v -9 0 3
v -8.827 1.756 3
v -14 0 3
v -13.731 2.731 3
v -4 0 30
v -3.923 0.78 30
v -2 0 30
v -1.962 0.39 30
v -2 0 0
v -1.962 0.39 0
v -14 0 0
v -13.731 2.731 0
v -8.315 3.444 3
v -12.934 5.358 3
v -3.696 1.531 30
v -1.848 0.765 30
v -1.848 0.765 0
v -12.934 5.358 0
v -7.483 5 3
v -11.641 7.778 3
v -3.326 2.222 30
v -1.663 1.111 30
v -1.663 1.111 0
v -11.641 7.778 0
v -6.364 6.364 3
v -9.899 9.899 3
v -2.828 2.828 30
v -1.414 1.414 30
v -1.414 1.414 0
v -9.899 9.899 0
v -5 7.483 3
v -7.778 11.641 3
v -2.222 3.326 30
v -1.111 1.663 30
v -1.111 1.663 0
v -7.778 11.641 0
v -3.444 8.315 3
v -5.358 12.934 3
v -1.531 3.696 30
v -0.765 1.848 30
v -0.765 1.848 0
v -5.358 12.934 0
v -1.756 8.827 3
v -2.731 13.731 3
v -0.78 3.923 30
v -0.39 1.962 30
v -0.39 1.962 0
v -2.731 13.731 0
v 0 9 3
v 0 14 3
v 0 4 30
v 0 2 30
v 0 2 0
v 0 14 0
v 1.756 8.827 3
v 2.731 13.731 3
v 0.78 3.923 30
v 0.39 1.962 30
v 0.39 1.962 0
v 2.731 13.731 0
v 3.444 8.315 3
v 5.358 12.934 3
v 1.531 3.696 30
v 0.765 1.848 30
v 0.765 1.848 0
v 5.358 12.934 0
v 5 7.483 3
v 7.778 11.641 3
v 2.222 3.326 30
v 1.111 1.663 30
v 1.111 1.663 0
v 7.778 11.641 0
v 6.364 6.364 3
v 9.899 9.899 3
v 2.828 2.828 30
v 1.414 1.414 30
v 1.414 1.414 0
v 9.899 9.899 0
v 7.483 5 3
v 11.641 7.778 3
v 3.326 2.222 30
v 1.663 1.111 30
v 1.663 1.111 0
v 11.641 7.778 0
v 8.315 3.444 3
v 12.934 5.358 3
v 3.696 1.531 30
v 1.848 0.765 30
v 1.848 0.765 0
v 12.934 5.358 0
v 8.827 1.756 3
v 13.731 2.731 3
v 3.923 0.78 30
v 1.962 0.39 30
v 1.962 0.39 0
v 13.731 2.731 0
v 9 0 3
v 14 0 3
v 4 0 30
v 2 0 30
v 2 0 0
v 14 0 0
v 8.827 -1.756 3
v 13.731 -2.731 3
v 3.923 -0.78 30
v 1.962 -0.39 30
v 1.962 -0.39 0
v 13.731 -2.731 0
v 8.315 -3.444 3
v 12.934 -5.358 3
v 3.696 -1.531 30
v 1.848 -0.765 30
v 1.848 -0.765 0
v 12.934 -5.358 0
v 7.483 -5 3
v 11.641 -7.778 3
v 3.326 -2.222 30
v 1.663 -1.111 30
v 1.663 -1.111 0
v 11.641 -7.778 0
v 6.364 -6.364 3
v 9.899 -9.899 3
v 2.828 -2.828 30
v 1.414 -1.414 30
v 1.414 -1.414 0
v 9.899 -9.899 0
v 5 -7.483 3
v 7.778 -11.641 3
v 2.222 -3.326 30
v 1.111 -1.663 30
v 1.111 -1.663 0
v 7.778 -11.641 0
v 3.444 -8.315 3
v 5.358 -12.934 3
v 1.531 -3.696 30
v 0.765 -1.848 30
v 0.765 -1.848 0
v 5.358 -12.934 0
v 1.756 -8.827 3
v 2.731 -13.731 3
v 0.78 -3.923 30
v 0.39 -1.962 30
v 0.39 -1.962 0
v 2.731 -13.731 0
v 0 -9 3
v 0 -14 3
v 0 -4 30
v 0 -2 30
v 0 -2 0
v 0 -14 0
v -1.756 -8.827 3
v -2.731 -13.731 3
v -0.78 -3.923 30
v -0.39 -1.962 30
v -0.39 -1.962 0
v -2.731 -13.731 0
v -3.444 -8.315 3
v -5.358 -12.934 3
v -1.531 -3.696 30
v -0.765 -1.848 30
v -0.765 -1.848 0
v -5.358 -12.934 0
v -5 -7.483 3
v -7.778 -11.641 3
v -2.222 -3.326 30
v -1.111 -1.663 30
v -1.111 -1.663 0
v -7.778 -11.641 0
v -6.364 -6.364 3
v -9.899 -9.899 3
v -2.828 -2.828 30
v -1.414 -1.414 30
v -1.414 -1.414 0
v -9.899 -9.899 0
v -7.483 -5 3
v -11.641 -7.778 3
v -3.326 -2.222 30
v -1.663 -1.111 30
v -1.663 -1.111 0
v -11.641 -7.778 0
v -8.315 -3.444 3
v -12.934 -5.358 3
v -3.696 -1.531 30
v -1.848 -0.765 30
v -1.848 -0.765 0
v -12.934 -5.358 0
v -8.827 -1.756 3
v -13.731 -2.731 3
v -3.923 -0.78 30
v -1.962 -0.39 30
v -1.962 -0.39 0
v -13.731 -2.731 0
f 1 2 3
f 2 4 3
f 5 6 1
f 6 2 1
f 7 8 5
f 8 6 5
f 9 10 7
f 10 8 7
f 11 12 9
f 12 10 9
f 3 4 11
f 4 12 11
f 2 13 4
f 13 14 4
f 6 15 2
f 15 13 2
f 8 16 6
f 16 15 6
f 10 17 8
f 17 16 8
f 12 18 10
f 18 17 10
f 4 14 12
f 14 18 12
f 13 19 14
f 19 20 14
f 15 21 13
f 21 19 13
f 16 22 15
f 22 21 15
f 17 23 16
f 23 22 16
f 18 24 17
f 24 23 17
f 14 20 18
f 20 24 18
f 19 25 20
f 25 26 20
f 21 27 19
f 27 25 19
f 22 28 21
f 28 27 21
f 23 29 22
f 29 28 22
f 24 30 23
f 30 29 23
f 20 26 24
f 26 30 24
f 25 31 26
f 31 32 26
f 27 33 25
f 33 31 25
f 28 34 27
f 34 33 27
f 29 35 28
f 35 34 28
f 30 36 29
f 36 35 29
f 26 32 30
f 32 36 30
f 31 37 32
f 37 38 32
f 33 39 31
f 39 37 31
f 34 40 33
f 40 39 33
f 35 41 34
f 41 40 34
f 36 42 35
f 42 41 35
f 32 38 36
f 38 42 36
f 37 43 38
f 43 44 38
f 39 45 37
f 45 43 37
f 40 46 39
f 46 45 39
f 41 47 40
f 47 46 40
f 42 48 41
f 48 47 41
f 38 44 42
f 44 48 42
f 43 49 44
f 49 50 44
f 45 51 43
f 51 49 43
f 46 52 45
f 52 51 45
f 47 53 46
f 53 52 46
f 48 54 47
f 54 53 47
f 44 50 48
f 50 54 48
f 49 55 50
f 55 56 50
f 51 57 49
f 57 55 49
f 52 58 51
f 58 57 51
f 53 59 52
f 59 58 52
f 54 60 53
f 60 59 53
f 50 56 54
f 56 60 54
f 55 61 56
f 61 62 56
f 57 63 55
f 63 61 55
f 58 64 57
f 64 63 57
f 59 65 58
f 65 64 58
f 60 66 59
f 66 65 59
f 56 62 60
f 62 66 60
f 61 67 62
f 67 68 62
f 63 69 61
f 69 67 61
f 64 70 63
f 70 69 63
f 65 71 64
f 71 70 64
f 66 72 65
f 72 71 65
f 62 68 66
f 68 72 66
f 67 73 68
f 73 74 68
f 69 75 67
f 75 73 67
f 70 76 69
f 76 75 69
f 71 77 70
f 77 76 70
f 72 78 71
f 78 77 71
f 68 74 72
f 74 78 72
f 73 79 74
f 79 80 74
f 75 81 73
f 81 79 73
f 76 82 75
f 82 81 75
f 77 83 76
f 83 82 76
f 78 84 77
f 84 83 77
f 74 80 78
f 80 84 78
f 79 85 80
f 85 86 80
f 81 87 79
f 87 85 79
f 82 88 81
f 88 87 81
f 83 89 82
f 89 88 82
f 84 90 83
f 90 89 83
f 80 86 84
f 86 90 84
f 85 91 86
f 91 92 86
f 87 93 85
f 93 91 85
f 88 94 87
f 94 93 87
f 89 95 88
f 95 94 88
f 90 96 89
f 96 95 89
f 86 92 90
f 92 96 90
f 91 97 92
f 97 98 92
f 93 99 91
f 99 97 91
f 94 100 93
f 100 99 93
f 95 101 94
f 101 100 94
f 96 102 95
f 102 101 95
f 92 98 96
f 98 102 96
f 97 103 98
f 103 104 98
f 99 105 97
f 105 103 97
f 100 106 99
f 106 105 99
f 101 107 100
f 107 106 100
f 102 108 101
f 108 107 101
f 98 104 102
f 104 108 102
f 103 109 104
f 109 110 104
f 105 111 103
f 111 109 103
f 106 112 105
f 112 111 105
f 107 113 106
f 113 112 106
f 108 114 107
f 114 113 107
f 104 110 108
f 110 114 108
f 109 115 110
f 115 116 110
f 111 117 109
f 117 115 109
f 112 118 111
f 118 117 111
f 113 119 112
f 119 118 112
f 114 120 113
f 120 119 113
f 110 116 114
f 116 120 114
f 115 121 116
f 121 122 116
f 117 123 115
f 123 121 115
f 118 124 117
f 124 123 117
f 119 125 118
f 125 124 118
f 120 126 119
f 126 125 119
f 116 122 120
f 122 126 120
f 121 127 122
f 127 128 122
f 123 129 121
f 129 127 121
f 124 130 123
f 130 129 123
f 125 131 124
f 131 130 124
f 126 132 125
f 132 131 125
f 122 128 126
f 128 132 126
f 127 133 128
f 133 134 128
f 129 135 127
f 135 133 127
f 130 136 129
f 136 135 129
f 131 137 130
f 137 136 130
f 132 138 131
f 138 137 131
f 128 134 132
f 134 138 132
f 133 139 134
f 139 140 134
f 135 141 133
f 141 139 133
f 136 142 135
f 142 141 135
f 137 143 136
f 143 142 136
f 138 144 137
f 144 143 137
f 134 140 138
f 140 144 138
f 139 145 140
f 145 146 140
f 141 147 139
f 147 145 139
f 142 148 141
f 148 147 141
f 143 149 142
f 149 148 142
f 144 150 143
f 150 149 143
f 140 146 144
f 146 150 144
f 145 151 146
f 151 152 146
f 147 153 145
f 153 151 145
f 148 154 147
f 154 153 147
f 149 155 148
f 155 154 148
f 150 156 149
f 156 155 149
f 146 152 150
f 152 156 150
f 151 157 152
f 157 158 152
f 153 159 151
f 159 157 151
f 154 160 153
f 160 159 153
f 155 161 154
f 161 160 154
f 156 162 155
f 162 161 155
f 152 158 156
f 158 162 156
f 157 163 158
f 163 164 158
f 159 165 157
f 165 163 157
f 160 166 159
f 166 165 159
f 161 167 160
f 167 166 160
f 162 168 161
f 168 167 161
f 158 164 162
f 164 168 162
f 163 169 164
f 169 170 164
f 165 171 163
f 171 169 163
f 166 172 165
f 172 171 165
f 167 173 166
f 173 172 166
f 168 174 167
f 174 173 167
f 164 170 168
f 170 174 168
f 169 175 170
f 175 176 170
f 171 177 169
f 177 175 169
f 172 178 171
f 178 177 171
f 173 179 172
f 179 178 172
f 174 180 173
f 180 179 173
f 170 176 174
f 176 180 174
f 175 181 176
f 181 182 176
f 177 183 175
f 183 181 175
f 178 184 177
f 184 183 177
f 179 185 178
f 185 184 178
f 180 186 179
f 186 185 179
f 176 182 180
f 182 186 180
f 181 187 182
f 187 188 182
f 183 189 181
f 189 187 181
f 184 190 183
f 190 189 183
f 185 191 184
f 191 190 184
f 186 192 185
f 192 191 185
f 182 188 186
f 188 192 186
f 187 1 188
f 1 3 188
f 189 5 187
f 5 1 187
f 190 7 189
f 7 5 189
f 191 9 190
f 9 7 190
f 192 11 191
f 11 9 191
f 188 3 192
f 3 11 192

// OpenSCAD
$fn = 32;

// ----------------------------------------------------------------------
// Profiled standoff: conical spacer, 30 mm long, bore 4 mm
// ----------------------------------------------------------------------

// --- parameters (mm) ---
revolve_angle = 360;      // full turn around the Z axis
profile_points = 6;       // points of the closed outline

profile = [[2, 0], [14, 0], [14, 3], [9, 3], [4, 30], [2, 30]];  // single closed polygon, 6 points, counter clockwise

// --- the one profile operation ---
rotate_extrude(angle = revolve_angle) polygon(points = profile);
